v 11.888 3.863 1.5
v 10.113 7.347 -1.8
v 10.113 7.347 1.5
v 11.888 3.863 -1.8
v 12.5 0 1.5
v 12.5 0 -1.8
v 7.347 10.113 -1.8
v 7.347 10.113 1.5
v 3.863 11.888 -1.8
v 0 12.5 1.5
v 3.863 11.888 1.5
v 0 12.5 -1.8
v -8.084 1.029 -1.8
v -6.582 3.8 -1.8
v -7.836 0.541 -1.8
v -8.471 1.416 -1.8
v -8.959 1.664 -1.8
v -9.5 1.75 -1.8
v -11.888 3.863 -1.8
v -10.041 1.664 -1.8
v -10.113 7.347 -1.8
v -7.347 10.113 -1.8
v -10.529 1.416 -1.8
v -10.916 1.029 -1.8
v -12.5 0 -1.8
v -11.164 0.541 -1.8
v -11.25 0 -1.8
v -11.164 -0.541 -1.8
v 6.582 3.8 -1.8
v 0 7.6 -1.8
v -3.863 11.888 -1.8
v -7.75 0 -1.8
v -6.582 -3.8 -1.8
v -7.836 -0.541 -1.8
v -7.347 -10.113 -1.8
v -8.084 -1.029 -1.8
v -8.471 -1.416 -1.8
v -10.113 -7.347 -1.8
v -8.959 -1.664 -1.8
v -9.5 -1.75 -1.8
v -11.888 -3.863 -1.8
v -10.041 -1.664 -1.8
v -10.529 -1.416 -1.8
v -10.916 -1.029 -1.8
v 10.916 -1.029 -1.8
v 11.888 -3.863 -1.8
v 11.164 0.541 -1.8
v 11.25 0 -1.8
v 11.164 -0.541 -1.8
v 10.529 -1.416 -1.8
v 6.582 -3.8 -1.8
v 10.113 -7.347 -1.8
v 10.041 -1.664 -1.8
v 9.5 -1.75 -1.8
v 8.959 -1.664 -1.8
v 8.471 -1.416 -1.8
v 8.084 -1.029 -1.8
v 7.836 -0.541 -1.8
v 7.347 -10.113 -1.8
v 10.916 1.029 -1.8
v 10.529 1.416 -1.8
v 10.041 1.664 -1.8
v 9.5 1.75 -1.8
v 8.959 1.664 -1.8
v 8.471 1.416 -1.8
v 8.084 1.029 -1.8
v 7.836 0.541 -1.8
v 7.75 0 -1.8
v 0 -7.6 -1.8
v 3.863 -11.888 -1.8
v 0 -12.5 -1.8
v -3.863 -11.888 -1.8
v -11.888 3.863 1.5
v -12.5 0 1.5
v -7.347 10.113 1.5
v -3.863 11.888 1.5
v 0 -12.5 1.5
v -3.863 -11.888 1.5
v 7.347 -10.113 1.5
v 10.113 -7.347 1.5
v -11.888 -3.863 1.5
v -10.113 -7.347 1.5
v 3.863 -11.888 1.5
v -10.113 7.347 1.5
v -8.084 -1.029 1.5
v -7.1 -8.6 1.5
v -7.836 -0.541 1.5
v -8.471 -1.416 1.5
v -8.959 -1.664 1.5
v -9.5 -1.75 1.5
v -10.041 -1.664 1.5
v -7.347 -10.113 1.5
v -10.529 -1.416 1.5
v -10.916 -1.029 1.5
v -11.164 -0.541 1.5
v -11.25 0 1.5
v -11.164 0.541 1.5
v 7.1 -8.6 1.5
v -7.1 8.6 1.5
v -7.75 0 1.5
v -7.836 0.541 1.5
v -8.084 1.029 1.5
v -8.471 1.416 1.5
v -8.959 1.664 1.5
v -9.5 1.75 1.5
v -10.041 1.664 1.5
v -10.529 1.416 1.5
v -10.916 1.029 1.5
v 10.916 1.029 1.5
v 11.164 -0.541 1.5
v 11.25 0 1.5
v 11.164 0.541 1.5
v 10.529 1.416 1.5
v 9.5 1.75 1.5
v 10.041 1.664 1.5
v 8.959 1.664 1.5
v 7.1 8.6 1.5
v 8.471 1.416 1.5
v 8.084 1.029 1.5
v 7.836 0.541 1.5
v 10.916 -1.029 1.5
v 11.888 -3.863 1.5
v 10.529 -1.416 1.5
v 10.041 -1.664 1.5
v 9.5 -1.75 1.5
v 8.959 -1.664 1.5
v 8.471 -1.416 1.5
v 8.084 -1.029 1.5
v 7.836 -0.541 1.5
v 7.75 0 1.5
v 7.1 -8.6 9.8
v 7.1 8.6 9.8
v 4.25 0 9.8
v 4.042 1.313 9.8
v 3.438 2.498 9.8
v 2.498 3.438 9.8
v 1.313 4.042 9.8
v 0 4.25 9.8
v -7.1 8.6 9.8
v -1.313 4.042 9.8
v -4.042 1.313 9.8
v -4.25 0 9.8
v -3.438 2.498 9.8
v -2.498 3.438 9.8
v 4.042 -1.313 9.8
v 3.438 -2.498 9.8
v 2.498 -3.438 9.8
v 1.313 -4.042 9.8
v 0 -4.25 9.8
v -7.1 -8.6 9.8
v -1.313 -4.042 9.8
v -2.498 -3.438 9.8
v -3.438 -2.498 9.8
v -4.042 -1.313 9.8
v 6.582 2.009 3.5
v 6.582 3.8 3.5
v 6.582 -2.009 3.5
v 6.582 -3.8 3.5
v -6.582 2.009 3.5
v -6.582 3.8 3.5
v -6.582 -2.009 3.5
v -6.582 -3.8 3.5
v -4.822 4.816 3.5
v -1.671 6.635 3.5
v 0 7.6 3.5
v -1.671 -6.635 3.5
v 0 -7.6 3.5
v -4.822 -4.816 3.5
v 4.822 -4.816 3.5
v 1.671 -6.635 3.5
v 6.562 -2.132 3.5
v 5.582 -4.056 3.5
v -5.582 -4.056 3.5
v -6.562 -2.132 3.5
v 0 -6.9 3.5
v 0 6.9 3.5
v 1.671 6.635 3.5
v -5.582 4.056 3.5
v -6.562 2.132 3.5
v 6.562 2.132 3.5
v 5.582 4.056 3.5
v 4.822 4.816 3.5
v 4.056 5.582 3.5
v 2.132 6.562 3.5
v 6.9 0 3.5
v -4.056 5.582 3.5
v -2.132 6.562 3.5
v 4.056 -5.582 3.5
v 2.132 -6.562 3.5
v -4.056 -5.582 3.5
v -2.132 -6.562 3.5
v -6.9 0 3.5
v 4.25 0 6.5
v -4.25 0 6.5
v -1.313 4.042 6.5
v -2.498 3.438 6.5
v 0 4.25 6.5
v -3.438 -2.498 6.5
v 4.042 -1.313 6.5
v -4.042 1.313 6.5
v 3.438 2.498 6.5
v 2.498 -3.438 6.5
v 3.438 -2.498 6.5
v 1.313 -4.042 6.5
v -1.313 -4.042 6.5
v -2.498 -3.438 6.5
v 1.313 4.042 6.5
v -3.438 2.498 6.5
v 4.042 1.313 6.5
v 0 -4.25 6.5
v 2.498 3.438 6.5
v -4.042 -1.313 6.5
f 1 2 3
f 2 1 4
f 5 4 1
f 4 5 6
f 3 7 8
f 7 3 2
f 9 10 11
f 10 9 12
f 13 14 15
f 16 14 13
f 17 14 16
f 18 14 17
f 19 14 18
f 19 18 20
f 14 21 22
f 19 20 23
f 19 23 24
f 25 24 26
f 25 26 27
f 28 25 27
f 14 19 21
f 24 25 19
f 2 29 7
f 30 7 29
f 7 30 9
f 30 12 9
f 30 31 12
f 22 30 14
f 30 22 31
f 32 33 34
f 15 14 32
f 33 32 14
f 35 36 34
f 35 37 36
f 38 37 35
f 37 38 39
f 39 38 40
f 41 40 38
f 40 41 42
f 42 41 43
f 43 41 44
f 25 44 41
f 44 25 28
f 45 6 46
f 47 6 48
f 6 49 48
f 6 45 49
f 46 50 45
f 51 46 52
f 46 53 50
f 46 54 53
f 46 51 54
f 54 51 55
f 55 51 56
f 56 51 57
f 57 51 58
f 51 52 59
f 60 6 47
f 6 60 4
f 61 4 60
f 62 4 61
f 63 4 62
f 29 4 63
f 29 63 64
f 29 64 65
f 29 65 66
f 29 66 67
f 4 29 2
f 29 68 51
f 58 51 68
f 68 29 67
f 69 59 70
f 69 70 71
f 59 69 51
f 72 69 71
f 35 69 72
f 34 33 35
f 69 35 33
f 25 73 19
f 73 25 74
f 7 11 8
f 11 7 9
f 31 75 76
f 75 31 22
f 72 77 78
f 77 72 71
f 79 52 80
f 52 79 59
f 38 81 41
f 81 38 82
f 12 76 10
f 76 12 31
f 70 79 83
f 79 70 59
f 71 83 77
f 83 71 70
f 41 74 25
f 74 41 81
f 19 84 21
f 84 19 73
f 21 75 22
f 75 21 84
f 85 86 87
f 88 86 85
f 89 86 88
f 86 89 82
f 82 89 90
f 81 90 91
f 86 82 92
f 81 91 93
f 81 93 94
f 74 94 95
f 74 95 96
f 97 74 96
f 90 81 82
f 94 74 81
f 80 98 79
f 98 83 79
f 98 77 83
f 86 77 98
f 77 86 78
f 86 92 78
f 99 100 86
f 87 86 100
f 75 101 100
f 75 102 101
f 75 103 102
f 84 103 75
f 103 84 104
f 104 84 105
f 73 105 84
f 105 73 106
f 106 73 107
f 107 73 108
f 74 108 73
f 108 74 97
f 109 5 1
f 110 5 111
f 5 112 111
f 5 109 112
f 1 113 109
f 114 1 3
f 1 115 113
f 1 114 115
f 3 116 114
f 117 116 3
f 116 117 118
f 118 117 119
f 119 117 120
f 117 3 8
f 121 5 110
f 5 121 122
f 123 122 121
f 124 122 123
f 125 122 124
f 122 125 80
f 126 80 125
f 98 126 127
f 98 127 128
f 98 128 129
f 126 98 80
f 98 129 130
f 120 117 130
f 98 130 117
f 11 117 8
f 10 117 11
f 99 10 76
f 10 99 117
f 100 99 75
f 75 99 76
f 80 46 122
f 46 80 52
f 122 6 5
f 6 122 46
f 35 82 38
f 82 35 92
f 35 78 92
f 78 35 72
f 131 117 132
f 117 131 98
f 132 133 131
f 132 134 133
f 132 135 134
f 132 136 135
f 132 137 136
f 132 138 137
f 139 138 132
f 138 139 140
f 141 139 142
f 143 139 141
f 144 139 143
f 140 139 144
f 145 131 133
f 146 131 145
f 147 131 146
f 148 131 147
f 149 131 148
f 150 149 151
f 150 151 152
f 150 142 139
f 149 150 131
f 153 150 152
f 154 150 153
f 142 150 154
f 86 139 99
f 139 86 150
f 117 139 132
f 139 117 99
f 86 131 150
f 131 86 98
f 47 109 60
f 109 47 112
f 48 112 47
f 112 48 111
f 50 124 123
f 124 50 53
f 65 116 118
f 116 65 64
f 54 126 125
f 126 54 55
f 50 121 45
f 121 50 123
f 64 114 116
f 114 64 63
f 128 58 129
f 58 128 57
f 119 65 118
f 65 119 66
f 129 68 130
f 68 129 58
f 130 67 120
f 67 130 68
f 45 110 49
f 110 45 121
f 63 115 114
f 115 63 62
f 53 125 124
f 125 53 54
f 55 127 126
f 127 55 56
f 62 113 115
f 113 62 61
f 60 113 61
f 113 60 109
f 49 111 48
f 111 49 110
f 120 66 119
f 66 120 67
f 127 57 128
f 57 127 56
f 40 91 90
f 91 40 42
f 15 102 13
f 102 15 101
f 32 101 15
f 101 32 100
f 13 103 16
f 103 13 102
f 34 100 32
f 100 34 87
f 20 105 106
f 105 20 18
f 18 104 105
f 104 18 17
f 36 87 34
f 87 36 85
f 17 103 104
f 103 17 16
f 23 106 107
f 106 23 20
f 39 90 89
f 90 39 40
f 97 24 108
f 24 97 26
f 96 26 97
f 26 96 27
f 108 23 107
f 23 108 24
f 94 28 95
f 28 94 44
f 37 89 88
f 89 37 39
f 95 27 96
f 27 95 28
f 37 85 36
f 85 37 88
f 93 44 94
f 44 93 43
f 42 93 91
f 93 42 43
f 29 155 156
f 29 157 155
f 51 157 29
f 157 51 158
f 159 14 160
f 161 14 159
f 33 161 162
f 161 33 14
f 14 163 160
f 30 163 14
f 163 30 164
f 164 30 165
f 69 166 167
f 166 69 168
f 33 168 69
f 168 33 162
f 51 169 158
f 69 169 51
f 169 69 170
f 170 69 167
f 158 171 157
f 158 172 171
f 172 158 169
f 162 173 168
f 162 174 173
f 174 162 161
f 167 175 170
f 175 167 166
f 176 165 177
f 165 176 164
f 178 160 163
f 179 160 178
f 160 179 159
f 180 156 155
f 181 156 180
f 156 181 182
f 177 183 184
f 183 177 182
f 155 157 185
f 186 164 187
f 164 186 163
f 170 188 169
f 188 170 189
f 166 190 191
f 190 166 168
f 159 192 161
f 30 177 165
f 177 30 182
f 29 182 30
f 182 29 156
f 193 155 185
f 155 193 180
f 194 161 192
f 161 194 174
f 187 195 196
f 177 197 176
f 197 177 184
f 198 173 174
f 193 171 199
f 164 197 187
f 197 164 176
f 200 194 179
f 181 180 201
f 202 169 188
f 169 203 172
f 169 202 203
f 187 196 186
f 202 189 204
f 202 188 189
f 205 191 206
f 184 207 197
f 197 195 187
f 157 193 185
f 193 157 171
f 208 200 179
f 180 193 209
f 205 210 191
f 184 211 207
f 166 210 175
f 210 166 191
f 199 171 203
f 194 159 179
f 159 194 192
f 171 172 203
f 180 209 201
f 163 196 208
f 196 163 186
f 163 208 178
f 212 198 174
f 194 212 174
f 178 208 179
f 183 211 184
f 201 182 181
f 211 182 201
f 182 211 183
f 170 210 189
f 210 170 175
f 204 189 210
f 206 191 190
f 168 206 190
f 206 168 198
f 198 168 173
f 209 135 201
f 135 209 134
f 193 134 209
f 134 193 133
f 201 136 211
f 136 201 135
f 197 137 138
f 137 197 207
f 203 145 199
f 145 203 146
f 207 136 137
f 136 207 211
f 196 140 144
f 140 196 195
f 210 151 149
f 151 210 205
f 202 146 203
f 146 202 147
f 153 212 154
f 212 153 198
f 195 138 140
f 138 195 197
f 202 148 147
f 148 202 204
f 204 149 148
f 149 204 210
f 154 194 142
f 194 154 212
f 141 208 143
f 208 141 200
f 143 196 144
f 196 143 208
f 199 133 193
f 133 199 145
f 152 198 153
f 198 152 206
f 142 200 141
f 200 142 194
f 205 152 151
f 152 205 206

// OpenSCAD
// Top part of M8 nut holder
// Updated by Alex Volkov
// From backport by Paul Arden <paul@arden.io> from Thomas Sanladerer's design.

render_fn = 20;

// All M8 values refer to M8 Nut dimension
m8_outer = 15.2;
m8_inner=8.5;
m8_height = 5.3;

max_height = m8_height + 0.9;


top_thick = 5;

module m3_holes(d,r,h){
     for (i = [0:6]) {
        translate([r*cos(i*180),r*sin(i*180),0]) cylinder(d=d,h=h,$fn=render_fn);
    }    
}

translate([0,0,-1.8]) 
difference(){
    union() {
        //base
        cylinder(d=25, h=3.3, $fn=render_fn);
        //outer wall for m8 nut
        translate([0,0, top_thick + 1])
        cube([m8_outer-1, m8_outer+2, max_height + top_thick], center=true);
        }
     
    rotate([0,0,90])
    cylinder(d1=m8_outer, d2=m8_outer, h=m8_height,$fn=6);
    
    //cone-shaped hole in top wall
    cone_height =  top_thick - 2;
    translate([0, 0, m8_height])
    cylinder(d1=m8_outer-1.4, d2=m8_inner, h=cone_height, $fn=render_fn);
    
    //round hole in top wall
    translate([0, 0, max_height+cone_height - 2])
    cylinder(d1=m8_inner, d2=m8_inner, h=top_thick +5, $fn=render_fn);
       
    
    m3_holes(3.5,9.5,4);
    
    translate([0,0,3.3-1.8])
    rotate([0,0,90])
    m3_holes(1,8.937/2,4);
    cylinder(d1=6.5,d2=5.5,h=0.5,$fn=render_fn);
}
